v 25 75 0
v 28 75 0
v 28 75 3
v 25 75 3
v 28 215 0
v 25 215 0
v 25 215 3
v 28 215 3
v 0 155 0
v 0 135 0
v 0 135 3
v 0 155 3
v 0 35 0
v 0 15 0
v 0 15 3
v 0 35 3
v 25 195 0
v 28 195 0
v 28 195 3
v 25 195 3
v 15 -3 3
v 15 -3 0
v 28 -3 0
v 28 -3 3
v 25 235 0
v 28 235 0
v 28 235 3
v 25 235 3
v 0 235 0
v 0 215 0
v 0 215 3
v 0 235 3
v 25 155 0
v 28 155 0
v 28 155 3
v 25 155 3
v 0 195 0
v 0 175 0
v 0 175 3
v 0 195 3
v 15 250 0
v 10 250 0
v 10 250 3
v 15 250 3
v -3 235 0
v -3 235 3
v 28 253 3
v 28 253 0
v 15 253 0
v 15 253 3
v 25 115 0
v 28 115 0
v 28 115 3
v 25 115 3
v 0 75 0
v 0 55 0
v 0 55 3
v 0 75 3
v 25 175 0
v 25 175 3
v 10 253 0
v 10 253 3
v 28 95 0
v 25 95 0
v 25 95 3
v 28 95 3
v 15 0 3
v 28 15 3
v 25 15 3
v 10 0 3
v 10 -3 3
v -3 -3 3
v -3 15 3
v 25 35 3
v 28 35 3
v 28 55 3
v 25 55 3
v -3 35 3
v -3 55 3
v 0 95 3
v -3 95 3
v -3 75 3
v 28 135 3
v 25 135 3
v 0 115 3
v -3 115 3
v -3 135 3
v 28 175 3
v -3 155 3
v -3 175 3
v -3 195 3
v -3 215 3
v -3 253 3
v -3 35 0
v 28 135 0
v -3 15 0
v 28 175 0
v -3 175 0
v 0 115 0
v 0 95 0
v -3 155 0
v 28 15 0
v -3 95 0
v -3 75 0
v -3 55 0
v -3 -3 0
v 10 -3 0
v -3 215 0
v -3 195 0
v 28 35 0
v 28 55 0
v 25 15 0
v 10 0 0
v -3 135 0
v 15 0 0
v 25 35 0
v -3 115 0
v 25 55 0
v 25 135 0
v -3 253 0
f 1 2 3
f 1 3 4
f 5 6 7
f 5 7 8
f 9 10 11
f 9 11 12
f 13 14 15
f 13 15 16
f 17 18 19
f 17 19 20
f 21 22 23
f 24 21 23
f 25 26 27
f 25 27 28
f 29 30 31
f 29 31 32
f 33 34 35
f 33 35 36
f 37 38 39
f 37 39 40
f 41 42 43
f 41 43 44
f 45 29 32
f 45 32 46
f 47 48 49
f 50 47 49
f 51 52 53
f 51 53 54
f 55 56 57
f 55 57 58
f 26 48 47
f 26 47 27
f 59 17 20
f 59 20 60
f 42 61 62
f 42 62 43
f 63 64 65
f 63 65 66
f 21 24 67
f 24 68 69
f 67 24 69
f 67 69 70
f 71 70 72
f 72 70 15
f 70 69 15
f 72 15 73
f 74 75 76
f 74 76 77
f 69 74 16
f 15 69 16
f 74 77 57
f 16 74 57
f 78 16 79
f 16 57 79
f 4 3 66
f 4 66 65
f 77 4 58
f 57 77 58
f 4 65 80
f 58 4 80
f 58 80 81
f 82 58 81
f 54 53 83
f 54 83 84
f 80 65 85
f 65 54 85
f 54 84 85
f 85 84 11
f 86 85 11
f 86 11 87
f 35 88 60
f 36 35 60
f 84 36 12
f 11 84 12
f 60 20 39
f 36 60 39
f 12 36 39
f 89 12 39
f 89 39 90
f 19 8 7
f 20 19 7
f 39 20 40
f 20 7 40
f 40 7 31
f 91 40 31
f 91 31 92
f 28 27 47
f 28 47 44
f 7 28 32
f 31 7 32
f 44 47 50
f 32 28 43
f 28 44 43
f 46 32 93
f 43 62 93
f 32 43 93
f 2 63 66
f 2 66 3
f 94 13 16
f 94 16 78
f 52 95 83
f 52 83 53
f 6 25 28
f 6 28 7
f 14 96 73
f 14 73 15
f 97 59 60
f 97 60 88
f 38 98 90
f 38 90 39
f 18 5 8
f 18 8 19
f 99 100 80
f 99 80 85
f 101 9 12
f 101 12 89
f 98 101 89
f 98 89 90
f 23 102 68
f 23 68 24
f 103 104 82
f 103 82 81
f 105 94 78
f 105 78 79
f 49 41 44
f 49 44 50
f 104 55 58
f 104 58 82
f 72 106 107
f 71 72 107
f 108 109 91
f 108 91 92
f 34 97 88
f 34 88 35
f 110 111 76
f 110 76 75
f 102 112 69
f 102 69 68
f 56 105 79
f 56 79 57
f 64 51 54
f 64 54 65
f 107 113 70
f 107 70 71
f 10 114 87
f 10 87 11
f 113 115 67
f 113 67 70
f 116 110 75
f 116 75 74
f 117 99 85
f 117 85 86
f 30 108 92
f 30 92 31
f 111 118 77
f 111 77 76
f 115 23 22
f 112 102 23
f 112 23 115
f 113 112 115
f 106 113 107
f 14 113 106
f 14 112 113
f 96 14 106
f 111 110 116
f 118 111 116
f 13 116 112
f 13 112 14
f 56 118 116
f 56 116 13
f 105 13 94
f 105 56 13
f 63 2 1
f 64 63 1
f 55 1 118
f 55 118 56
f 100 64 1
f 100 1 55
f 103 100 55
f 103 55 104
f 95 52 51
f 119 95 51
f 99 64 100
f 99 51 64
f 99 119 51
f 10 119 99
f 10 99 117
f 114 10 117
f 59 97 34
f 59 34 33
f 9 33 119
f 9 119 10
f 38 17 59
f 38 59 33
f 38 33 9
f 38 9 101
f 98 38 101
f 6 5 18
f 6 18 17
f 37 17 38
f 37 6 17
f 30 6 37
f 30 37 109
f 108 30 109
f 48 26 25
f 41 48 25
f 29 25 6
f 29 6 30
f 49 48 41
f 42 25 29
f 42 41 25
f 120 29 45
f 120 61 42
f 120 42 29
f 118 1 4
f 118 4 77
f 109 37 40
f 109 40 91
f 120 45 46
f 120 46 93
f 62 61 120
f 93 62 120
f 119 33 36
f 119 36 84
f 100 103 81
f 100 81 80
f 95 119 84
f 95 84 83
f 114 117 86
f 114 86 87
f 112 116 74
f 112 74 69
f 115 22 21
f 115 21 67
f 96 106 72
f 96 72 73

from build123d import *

# Parameters (mm, degrees)
BOSS_EXTRUDE3_DEPTH = 3


with BuildPart() as part:
    # Sketch2 → Boss-Extrude3 (new body)
    with BuildSketch(Plane.XY):
        Polygon((10, 250), (15, 250), (15, 253), (25, 253), (28, 253), (28, 235), (25, 235), (25, 215), (28, 215), (28, 195), (25, 195), (25, 175), (28, 175), (28, 155), (25, 155), (25, 135), (28, 135), (28, 115), (25, 115), (25, 95), (28, 95), (28, 75), (25, 75), (25, 55), (28, 55), (28, 35), (25, 35), (25, 15), (28, 15), (28, -3), (25, -3), (15, -3), (15, 0), (10, 0), (10, -3), (0, -3), (-3, -3), (-3, 15), (0, 15), (0, 35), (-3, 35), (-3, 55), (0, 55), (0, 75), (-3, 75), (-3, 95), (0, 95), (0, 115), (-3, 115), (-3, 135), (0, 135), (0, 155), (-3, 155), (-3, 175), (0, 175), (0, 195), (-3, 195), (-3, 215), (0, 215), (0, 235), (-3, 235), (-3, 253), (0, 253), (10, 253), align=None)
    extrude(amount=BOSS_EXTRUDE3_DEPTH)


solid = part.part
